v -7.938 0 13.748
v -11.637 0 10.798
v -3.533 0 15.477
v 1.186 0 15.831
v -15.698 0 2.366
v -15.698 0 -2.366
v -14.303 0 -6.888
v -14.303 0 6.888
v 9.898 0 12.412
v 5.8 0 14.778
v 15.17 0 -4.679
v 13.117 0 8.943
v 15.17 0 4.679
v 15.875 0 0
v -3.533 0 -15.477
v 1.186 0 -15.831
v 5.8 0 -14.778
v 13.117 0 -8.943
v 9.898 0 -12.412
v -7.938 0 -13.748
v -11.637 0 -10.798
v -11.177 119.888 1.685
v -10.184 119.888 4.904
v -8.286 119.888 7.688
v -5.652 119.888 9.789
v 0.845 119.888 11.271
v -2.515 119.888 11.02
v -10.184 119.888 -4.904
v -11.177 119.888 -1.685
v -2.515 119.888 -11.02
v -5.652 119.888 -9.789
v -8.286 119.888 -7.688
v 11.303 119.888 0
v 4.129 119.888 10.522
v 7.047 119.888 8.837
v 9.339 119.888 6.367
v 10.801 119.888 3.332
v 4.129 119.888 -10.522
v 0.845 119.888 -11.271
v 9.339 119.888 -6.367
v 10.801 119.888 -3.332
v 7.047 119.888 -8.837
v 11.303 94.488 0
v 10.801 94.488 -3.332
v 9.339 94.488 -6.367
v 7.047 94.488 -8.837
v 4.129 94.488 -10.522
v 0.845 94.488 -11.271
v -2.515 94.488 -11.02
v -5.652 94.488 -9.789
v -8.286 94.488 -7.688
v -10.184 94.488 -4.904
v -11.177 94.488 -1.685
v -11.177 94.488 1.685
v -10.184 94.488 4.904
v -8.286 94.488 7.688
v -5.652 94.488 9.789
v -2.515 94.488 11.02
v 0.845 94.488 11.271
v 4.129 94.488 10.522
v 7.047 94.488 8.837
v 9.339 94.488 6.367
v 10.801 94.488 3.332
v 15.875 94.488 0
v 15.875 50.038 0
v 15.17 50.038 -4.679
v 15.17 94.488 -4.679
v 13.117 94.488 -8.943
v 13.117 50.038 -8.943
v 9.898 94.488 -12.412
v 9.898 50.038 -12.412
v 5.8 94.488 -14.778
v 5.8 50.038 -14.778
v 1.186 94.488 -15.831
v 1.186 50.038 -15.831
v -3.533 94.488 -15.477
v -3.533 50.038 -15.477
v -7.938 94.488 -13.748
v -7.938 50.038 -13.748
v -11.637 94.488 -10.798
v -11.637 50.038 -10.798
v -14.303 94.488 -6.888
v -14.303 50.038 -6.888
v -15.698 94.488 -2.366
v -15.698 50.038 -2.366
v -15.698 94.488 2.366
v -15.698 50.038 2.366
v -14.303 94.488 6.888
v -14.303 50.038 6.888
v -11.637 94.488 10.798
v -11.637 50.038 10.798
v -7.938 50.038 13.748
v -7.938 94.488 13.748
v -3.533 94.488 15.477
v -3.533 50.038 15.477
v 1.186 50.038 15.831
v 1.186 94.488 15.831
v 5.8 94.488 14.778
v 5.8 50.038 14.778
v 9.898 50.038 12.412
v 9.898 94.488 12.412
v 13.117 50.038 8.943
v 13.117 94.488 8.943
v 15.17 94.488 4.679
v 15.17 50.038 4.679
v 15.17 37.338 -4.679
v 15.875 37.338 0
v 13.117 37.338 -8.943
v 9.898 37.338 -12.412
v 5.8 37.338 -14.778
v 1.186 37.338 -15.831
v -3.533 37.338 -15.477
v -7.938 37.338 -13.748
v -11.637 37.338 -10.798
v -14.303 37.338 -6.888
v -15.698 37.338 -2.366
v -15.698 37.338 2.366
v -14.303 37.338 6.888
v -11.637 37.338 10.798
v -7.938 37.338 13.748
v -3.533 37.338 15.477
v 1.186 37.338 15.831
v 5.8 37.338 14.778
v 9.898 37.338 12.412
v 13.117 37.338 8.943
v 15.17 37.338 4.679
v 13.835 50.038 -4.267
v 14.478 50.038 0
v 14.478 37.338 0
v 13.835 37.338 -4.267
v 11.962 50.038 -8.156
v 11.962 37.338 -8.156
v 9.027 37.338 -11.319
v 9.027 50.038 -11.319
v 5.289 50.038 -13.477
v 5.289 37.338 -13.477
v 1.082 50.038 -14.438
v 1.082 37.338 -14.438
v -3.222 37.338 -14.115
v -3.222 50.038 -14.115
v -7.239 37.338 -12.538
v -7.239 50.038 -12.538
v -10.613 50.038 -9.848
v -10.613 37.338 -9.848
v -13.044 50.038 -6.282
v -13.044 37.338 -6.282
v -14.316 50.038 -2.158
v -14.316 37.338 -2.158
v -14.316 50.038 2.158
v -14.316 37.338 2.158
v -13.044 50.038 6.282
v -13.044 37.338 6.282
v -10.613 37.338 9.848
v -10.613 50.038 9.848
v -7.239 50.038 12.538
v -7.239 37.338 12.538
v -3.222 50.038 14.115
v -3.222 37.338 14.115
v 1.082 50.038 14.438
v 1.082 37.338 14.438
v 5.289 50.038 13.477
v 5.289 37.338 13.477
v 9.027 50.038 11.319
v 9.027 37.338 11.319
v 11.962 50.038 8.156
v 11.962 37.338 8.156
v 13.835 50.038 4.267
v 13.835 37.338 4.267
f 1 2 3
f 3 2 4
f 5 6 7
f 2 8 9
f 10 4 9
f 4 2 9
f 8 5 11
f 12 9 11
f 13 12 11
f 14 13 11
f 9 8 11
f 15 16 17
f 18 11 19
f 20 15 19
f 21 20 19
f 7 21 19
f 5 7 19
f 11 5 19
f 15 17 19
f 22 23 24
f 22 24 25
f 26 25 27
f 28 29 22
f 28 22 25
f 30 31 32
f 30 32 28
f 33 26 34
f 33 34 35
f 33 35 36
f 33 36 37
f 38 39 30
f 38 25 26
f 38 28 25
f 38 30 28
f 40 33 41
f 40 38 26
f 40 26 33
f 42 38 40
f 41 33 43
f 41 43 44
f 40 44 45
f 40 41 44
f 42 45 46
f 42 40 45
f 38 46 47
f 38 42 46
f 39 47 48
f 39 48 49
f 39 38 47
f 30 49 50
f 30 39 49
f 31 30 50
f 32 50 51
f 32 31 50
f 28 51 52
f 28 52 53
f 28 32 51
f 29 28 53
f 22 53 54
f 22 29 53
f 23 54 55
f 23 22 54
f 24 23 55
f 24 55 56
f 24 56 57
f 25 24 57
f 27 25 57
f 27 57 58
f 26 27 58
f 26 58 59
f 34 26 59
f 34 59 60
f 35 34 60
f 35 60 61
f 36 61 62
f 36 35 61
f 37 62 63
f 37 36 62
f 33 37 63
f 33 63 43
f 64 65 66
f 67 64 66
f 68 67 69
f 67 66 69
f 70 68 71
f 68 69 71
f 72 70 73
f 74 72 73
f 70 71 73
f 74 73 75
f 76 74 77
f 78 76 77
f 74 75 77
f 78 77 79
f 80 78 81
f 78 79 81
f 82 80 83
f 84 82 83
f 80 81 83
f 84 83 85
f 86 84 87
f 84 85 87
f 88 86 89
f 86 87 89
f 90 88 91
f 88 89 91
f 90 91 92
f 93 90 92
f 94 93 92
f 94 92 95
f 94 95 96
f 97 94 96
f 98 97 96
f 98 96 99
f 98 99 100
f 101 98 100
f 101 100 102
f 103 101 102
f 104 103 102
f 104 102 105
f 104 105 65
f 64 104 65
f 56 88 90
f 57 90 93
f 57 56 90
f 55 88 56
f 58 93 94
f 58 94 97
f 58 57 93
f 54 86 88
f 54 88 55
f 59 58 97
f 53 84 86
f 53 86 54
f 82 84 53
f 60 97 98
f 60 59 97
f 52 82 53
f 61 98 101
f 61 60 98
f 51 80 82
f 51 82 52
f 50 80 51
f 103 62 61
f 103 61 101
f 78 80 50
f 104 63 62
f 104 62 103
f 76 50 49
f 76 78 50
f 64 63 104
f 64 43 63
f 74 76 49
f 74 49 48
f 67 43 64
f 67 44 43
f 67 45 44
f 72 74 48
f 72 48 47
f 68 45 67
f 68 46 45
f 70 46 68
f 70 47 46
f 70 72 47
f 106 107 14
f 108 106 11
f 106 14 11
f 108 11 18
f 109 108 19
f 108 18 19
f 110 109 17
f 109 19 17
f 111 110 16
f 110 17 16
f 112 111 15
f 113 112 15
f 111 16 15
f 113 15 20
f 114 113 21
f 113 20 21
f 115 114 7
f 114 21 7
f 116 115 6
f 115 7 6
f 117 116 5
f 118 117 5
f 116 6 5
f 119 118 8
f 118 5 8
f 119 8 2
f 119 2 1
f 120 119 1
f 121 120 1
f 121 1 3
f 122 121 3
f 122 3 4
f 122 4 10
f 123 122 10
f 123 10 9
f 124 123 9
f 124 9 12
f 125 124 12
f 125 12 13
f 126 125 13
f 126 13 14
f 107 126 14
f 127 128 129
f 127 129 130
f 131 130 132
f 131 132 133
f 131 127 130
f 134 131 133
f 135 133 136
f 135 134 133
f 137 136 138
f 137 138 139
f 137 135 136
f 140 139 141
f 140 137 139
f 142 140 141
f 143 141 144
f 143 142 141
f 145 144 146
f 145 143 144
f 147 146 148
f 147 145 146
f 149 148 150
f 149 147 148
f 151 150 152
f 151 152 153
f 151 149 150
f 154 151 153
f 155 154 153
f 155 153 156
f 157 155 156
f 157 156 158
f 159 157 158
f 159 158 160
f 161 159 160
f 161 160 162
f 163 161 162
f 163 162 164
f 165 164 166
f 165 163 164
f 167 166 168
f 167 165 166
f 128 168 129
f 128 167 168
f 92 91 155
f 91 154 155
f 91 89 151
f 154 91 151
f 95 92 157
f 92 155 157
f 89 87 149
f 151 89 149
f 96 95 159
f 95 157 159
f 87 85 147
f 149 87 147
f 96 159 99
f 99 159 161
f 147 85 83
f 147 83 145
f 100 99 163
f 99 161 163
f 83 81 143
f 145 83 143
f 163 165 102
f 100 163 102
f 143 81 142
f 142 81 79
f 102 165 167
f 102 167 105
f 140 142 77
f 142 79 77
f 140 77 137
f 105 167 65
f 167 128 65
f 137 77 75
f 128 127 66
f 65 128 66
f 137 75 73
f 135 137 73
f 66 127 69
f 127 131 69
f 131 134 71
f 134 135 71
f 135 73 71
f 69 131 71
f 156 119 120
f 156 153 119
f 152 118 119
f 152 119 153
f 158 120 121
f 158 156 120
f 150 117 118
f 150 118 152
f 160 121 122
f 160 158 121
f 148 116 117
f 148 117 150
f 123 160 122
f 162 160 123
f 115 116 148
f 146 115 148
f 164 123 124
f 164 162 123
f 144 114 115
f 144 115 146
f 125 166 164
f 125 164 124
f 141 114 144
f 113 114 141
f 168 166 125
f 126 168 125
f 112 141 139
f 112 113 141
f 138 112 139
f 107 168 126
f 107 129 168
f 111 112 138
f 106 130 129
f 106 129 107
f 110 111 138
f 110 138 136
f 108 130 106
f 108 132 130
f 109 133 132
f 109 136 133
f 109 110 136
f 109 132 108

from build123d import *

# Parameters (mm, degrees)
SKETCH1_R           = 15.875
BOSS_EXTRUDE1_DEPTH = 119.888
SKETCH2_R           = 15.875
SKETCH2_R_2         = 11.303
CUT_EXTRUDE1_DEPTH  = 25.4
CUT_EXTRUDE2_START  = -69.85
SKETCH3_R           = 15.875
SKETCH3_R_2         = 14.478
CUT_EXTRUDE2_DEPTH  = 12.7


with BuildPart() as part:
    # Sketch1 → Boss-Extrude1 (new body)
    with BuildSketch(Plane(origin=(0, 0, 0), x_dir=(1, 0, 0), z_dir=(0, 1, 0))):
        Circle(SKETCH1_R)
    extrude(amount=BOSS_EXTRUDE1_DEPTH)

    # Sketch2 → Cut-Extrude1 (cut)
    with BuildSketch(Plane(origin=(0, 119.888, 0), x_dir=(1, 0, 0), z_dir=(0, 1, 0))):
        Circle(SKETCH2_R)
        Circle(SKETCH2_R_2, mode=Mode.SUBTRACT)
    extrude(amount=-CUT_EXTRUDE1_DEPTH, mode=Mode.SUBTRACT)

    # Sketch3 → Cut-Extrude2 (cut)
    with BuildSketch(Plane(origin=(0, 119.888, 0), x_dir=(1, 0, 0), z_dir=(0, 1, 0)).offset(CUT_EXTRUDE2_START)):
        Circle(SKETCH3_R)
        Circle(SKETCH3_R_2, mode=Mode.SUBTRACT)
    extrude(amount=-CUT_EXTRUDE2_DEPTH, mode=Mode.SUBTRACT)


solid = part.part
